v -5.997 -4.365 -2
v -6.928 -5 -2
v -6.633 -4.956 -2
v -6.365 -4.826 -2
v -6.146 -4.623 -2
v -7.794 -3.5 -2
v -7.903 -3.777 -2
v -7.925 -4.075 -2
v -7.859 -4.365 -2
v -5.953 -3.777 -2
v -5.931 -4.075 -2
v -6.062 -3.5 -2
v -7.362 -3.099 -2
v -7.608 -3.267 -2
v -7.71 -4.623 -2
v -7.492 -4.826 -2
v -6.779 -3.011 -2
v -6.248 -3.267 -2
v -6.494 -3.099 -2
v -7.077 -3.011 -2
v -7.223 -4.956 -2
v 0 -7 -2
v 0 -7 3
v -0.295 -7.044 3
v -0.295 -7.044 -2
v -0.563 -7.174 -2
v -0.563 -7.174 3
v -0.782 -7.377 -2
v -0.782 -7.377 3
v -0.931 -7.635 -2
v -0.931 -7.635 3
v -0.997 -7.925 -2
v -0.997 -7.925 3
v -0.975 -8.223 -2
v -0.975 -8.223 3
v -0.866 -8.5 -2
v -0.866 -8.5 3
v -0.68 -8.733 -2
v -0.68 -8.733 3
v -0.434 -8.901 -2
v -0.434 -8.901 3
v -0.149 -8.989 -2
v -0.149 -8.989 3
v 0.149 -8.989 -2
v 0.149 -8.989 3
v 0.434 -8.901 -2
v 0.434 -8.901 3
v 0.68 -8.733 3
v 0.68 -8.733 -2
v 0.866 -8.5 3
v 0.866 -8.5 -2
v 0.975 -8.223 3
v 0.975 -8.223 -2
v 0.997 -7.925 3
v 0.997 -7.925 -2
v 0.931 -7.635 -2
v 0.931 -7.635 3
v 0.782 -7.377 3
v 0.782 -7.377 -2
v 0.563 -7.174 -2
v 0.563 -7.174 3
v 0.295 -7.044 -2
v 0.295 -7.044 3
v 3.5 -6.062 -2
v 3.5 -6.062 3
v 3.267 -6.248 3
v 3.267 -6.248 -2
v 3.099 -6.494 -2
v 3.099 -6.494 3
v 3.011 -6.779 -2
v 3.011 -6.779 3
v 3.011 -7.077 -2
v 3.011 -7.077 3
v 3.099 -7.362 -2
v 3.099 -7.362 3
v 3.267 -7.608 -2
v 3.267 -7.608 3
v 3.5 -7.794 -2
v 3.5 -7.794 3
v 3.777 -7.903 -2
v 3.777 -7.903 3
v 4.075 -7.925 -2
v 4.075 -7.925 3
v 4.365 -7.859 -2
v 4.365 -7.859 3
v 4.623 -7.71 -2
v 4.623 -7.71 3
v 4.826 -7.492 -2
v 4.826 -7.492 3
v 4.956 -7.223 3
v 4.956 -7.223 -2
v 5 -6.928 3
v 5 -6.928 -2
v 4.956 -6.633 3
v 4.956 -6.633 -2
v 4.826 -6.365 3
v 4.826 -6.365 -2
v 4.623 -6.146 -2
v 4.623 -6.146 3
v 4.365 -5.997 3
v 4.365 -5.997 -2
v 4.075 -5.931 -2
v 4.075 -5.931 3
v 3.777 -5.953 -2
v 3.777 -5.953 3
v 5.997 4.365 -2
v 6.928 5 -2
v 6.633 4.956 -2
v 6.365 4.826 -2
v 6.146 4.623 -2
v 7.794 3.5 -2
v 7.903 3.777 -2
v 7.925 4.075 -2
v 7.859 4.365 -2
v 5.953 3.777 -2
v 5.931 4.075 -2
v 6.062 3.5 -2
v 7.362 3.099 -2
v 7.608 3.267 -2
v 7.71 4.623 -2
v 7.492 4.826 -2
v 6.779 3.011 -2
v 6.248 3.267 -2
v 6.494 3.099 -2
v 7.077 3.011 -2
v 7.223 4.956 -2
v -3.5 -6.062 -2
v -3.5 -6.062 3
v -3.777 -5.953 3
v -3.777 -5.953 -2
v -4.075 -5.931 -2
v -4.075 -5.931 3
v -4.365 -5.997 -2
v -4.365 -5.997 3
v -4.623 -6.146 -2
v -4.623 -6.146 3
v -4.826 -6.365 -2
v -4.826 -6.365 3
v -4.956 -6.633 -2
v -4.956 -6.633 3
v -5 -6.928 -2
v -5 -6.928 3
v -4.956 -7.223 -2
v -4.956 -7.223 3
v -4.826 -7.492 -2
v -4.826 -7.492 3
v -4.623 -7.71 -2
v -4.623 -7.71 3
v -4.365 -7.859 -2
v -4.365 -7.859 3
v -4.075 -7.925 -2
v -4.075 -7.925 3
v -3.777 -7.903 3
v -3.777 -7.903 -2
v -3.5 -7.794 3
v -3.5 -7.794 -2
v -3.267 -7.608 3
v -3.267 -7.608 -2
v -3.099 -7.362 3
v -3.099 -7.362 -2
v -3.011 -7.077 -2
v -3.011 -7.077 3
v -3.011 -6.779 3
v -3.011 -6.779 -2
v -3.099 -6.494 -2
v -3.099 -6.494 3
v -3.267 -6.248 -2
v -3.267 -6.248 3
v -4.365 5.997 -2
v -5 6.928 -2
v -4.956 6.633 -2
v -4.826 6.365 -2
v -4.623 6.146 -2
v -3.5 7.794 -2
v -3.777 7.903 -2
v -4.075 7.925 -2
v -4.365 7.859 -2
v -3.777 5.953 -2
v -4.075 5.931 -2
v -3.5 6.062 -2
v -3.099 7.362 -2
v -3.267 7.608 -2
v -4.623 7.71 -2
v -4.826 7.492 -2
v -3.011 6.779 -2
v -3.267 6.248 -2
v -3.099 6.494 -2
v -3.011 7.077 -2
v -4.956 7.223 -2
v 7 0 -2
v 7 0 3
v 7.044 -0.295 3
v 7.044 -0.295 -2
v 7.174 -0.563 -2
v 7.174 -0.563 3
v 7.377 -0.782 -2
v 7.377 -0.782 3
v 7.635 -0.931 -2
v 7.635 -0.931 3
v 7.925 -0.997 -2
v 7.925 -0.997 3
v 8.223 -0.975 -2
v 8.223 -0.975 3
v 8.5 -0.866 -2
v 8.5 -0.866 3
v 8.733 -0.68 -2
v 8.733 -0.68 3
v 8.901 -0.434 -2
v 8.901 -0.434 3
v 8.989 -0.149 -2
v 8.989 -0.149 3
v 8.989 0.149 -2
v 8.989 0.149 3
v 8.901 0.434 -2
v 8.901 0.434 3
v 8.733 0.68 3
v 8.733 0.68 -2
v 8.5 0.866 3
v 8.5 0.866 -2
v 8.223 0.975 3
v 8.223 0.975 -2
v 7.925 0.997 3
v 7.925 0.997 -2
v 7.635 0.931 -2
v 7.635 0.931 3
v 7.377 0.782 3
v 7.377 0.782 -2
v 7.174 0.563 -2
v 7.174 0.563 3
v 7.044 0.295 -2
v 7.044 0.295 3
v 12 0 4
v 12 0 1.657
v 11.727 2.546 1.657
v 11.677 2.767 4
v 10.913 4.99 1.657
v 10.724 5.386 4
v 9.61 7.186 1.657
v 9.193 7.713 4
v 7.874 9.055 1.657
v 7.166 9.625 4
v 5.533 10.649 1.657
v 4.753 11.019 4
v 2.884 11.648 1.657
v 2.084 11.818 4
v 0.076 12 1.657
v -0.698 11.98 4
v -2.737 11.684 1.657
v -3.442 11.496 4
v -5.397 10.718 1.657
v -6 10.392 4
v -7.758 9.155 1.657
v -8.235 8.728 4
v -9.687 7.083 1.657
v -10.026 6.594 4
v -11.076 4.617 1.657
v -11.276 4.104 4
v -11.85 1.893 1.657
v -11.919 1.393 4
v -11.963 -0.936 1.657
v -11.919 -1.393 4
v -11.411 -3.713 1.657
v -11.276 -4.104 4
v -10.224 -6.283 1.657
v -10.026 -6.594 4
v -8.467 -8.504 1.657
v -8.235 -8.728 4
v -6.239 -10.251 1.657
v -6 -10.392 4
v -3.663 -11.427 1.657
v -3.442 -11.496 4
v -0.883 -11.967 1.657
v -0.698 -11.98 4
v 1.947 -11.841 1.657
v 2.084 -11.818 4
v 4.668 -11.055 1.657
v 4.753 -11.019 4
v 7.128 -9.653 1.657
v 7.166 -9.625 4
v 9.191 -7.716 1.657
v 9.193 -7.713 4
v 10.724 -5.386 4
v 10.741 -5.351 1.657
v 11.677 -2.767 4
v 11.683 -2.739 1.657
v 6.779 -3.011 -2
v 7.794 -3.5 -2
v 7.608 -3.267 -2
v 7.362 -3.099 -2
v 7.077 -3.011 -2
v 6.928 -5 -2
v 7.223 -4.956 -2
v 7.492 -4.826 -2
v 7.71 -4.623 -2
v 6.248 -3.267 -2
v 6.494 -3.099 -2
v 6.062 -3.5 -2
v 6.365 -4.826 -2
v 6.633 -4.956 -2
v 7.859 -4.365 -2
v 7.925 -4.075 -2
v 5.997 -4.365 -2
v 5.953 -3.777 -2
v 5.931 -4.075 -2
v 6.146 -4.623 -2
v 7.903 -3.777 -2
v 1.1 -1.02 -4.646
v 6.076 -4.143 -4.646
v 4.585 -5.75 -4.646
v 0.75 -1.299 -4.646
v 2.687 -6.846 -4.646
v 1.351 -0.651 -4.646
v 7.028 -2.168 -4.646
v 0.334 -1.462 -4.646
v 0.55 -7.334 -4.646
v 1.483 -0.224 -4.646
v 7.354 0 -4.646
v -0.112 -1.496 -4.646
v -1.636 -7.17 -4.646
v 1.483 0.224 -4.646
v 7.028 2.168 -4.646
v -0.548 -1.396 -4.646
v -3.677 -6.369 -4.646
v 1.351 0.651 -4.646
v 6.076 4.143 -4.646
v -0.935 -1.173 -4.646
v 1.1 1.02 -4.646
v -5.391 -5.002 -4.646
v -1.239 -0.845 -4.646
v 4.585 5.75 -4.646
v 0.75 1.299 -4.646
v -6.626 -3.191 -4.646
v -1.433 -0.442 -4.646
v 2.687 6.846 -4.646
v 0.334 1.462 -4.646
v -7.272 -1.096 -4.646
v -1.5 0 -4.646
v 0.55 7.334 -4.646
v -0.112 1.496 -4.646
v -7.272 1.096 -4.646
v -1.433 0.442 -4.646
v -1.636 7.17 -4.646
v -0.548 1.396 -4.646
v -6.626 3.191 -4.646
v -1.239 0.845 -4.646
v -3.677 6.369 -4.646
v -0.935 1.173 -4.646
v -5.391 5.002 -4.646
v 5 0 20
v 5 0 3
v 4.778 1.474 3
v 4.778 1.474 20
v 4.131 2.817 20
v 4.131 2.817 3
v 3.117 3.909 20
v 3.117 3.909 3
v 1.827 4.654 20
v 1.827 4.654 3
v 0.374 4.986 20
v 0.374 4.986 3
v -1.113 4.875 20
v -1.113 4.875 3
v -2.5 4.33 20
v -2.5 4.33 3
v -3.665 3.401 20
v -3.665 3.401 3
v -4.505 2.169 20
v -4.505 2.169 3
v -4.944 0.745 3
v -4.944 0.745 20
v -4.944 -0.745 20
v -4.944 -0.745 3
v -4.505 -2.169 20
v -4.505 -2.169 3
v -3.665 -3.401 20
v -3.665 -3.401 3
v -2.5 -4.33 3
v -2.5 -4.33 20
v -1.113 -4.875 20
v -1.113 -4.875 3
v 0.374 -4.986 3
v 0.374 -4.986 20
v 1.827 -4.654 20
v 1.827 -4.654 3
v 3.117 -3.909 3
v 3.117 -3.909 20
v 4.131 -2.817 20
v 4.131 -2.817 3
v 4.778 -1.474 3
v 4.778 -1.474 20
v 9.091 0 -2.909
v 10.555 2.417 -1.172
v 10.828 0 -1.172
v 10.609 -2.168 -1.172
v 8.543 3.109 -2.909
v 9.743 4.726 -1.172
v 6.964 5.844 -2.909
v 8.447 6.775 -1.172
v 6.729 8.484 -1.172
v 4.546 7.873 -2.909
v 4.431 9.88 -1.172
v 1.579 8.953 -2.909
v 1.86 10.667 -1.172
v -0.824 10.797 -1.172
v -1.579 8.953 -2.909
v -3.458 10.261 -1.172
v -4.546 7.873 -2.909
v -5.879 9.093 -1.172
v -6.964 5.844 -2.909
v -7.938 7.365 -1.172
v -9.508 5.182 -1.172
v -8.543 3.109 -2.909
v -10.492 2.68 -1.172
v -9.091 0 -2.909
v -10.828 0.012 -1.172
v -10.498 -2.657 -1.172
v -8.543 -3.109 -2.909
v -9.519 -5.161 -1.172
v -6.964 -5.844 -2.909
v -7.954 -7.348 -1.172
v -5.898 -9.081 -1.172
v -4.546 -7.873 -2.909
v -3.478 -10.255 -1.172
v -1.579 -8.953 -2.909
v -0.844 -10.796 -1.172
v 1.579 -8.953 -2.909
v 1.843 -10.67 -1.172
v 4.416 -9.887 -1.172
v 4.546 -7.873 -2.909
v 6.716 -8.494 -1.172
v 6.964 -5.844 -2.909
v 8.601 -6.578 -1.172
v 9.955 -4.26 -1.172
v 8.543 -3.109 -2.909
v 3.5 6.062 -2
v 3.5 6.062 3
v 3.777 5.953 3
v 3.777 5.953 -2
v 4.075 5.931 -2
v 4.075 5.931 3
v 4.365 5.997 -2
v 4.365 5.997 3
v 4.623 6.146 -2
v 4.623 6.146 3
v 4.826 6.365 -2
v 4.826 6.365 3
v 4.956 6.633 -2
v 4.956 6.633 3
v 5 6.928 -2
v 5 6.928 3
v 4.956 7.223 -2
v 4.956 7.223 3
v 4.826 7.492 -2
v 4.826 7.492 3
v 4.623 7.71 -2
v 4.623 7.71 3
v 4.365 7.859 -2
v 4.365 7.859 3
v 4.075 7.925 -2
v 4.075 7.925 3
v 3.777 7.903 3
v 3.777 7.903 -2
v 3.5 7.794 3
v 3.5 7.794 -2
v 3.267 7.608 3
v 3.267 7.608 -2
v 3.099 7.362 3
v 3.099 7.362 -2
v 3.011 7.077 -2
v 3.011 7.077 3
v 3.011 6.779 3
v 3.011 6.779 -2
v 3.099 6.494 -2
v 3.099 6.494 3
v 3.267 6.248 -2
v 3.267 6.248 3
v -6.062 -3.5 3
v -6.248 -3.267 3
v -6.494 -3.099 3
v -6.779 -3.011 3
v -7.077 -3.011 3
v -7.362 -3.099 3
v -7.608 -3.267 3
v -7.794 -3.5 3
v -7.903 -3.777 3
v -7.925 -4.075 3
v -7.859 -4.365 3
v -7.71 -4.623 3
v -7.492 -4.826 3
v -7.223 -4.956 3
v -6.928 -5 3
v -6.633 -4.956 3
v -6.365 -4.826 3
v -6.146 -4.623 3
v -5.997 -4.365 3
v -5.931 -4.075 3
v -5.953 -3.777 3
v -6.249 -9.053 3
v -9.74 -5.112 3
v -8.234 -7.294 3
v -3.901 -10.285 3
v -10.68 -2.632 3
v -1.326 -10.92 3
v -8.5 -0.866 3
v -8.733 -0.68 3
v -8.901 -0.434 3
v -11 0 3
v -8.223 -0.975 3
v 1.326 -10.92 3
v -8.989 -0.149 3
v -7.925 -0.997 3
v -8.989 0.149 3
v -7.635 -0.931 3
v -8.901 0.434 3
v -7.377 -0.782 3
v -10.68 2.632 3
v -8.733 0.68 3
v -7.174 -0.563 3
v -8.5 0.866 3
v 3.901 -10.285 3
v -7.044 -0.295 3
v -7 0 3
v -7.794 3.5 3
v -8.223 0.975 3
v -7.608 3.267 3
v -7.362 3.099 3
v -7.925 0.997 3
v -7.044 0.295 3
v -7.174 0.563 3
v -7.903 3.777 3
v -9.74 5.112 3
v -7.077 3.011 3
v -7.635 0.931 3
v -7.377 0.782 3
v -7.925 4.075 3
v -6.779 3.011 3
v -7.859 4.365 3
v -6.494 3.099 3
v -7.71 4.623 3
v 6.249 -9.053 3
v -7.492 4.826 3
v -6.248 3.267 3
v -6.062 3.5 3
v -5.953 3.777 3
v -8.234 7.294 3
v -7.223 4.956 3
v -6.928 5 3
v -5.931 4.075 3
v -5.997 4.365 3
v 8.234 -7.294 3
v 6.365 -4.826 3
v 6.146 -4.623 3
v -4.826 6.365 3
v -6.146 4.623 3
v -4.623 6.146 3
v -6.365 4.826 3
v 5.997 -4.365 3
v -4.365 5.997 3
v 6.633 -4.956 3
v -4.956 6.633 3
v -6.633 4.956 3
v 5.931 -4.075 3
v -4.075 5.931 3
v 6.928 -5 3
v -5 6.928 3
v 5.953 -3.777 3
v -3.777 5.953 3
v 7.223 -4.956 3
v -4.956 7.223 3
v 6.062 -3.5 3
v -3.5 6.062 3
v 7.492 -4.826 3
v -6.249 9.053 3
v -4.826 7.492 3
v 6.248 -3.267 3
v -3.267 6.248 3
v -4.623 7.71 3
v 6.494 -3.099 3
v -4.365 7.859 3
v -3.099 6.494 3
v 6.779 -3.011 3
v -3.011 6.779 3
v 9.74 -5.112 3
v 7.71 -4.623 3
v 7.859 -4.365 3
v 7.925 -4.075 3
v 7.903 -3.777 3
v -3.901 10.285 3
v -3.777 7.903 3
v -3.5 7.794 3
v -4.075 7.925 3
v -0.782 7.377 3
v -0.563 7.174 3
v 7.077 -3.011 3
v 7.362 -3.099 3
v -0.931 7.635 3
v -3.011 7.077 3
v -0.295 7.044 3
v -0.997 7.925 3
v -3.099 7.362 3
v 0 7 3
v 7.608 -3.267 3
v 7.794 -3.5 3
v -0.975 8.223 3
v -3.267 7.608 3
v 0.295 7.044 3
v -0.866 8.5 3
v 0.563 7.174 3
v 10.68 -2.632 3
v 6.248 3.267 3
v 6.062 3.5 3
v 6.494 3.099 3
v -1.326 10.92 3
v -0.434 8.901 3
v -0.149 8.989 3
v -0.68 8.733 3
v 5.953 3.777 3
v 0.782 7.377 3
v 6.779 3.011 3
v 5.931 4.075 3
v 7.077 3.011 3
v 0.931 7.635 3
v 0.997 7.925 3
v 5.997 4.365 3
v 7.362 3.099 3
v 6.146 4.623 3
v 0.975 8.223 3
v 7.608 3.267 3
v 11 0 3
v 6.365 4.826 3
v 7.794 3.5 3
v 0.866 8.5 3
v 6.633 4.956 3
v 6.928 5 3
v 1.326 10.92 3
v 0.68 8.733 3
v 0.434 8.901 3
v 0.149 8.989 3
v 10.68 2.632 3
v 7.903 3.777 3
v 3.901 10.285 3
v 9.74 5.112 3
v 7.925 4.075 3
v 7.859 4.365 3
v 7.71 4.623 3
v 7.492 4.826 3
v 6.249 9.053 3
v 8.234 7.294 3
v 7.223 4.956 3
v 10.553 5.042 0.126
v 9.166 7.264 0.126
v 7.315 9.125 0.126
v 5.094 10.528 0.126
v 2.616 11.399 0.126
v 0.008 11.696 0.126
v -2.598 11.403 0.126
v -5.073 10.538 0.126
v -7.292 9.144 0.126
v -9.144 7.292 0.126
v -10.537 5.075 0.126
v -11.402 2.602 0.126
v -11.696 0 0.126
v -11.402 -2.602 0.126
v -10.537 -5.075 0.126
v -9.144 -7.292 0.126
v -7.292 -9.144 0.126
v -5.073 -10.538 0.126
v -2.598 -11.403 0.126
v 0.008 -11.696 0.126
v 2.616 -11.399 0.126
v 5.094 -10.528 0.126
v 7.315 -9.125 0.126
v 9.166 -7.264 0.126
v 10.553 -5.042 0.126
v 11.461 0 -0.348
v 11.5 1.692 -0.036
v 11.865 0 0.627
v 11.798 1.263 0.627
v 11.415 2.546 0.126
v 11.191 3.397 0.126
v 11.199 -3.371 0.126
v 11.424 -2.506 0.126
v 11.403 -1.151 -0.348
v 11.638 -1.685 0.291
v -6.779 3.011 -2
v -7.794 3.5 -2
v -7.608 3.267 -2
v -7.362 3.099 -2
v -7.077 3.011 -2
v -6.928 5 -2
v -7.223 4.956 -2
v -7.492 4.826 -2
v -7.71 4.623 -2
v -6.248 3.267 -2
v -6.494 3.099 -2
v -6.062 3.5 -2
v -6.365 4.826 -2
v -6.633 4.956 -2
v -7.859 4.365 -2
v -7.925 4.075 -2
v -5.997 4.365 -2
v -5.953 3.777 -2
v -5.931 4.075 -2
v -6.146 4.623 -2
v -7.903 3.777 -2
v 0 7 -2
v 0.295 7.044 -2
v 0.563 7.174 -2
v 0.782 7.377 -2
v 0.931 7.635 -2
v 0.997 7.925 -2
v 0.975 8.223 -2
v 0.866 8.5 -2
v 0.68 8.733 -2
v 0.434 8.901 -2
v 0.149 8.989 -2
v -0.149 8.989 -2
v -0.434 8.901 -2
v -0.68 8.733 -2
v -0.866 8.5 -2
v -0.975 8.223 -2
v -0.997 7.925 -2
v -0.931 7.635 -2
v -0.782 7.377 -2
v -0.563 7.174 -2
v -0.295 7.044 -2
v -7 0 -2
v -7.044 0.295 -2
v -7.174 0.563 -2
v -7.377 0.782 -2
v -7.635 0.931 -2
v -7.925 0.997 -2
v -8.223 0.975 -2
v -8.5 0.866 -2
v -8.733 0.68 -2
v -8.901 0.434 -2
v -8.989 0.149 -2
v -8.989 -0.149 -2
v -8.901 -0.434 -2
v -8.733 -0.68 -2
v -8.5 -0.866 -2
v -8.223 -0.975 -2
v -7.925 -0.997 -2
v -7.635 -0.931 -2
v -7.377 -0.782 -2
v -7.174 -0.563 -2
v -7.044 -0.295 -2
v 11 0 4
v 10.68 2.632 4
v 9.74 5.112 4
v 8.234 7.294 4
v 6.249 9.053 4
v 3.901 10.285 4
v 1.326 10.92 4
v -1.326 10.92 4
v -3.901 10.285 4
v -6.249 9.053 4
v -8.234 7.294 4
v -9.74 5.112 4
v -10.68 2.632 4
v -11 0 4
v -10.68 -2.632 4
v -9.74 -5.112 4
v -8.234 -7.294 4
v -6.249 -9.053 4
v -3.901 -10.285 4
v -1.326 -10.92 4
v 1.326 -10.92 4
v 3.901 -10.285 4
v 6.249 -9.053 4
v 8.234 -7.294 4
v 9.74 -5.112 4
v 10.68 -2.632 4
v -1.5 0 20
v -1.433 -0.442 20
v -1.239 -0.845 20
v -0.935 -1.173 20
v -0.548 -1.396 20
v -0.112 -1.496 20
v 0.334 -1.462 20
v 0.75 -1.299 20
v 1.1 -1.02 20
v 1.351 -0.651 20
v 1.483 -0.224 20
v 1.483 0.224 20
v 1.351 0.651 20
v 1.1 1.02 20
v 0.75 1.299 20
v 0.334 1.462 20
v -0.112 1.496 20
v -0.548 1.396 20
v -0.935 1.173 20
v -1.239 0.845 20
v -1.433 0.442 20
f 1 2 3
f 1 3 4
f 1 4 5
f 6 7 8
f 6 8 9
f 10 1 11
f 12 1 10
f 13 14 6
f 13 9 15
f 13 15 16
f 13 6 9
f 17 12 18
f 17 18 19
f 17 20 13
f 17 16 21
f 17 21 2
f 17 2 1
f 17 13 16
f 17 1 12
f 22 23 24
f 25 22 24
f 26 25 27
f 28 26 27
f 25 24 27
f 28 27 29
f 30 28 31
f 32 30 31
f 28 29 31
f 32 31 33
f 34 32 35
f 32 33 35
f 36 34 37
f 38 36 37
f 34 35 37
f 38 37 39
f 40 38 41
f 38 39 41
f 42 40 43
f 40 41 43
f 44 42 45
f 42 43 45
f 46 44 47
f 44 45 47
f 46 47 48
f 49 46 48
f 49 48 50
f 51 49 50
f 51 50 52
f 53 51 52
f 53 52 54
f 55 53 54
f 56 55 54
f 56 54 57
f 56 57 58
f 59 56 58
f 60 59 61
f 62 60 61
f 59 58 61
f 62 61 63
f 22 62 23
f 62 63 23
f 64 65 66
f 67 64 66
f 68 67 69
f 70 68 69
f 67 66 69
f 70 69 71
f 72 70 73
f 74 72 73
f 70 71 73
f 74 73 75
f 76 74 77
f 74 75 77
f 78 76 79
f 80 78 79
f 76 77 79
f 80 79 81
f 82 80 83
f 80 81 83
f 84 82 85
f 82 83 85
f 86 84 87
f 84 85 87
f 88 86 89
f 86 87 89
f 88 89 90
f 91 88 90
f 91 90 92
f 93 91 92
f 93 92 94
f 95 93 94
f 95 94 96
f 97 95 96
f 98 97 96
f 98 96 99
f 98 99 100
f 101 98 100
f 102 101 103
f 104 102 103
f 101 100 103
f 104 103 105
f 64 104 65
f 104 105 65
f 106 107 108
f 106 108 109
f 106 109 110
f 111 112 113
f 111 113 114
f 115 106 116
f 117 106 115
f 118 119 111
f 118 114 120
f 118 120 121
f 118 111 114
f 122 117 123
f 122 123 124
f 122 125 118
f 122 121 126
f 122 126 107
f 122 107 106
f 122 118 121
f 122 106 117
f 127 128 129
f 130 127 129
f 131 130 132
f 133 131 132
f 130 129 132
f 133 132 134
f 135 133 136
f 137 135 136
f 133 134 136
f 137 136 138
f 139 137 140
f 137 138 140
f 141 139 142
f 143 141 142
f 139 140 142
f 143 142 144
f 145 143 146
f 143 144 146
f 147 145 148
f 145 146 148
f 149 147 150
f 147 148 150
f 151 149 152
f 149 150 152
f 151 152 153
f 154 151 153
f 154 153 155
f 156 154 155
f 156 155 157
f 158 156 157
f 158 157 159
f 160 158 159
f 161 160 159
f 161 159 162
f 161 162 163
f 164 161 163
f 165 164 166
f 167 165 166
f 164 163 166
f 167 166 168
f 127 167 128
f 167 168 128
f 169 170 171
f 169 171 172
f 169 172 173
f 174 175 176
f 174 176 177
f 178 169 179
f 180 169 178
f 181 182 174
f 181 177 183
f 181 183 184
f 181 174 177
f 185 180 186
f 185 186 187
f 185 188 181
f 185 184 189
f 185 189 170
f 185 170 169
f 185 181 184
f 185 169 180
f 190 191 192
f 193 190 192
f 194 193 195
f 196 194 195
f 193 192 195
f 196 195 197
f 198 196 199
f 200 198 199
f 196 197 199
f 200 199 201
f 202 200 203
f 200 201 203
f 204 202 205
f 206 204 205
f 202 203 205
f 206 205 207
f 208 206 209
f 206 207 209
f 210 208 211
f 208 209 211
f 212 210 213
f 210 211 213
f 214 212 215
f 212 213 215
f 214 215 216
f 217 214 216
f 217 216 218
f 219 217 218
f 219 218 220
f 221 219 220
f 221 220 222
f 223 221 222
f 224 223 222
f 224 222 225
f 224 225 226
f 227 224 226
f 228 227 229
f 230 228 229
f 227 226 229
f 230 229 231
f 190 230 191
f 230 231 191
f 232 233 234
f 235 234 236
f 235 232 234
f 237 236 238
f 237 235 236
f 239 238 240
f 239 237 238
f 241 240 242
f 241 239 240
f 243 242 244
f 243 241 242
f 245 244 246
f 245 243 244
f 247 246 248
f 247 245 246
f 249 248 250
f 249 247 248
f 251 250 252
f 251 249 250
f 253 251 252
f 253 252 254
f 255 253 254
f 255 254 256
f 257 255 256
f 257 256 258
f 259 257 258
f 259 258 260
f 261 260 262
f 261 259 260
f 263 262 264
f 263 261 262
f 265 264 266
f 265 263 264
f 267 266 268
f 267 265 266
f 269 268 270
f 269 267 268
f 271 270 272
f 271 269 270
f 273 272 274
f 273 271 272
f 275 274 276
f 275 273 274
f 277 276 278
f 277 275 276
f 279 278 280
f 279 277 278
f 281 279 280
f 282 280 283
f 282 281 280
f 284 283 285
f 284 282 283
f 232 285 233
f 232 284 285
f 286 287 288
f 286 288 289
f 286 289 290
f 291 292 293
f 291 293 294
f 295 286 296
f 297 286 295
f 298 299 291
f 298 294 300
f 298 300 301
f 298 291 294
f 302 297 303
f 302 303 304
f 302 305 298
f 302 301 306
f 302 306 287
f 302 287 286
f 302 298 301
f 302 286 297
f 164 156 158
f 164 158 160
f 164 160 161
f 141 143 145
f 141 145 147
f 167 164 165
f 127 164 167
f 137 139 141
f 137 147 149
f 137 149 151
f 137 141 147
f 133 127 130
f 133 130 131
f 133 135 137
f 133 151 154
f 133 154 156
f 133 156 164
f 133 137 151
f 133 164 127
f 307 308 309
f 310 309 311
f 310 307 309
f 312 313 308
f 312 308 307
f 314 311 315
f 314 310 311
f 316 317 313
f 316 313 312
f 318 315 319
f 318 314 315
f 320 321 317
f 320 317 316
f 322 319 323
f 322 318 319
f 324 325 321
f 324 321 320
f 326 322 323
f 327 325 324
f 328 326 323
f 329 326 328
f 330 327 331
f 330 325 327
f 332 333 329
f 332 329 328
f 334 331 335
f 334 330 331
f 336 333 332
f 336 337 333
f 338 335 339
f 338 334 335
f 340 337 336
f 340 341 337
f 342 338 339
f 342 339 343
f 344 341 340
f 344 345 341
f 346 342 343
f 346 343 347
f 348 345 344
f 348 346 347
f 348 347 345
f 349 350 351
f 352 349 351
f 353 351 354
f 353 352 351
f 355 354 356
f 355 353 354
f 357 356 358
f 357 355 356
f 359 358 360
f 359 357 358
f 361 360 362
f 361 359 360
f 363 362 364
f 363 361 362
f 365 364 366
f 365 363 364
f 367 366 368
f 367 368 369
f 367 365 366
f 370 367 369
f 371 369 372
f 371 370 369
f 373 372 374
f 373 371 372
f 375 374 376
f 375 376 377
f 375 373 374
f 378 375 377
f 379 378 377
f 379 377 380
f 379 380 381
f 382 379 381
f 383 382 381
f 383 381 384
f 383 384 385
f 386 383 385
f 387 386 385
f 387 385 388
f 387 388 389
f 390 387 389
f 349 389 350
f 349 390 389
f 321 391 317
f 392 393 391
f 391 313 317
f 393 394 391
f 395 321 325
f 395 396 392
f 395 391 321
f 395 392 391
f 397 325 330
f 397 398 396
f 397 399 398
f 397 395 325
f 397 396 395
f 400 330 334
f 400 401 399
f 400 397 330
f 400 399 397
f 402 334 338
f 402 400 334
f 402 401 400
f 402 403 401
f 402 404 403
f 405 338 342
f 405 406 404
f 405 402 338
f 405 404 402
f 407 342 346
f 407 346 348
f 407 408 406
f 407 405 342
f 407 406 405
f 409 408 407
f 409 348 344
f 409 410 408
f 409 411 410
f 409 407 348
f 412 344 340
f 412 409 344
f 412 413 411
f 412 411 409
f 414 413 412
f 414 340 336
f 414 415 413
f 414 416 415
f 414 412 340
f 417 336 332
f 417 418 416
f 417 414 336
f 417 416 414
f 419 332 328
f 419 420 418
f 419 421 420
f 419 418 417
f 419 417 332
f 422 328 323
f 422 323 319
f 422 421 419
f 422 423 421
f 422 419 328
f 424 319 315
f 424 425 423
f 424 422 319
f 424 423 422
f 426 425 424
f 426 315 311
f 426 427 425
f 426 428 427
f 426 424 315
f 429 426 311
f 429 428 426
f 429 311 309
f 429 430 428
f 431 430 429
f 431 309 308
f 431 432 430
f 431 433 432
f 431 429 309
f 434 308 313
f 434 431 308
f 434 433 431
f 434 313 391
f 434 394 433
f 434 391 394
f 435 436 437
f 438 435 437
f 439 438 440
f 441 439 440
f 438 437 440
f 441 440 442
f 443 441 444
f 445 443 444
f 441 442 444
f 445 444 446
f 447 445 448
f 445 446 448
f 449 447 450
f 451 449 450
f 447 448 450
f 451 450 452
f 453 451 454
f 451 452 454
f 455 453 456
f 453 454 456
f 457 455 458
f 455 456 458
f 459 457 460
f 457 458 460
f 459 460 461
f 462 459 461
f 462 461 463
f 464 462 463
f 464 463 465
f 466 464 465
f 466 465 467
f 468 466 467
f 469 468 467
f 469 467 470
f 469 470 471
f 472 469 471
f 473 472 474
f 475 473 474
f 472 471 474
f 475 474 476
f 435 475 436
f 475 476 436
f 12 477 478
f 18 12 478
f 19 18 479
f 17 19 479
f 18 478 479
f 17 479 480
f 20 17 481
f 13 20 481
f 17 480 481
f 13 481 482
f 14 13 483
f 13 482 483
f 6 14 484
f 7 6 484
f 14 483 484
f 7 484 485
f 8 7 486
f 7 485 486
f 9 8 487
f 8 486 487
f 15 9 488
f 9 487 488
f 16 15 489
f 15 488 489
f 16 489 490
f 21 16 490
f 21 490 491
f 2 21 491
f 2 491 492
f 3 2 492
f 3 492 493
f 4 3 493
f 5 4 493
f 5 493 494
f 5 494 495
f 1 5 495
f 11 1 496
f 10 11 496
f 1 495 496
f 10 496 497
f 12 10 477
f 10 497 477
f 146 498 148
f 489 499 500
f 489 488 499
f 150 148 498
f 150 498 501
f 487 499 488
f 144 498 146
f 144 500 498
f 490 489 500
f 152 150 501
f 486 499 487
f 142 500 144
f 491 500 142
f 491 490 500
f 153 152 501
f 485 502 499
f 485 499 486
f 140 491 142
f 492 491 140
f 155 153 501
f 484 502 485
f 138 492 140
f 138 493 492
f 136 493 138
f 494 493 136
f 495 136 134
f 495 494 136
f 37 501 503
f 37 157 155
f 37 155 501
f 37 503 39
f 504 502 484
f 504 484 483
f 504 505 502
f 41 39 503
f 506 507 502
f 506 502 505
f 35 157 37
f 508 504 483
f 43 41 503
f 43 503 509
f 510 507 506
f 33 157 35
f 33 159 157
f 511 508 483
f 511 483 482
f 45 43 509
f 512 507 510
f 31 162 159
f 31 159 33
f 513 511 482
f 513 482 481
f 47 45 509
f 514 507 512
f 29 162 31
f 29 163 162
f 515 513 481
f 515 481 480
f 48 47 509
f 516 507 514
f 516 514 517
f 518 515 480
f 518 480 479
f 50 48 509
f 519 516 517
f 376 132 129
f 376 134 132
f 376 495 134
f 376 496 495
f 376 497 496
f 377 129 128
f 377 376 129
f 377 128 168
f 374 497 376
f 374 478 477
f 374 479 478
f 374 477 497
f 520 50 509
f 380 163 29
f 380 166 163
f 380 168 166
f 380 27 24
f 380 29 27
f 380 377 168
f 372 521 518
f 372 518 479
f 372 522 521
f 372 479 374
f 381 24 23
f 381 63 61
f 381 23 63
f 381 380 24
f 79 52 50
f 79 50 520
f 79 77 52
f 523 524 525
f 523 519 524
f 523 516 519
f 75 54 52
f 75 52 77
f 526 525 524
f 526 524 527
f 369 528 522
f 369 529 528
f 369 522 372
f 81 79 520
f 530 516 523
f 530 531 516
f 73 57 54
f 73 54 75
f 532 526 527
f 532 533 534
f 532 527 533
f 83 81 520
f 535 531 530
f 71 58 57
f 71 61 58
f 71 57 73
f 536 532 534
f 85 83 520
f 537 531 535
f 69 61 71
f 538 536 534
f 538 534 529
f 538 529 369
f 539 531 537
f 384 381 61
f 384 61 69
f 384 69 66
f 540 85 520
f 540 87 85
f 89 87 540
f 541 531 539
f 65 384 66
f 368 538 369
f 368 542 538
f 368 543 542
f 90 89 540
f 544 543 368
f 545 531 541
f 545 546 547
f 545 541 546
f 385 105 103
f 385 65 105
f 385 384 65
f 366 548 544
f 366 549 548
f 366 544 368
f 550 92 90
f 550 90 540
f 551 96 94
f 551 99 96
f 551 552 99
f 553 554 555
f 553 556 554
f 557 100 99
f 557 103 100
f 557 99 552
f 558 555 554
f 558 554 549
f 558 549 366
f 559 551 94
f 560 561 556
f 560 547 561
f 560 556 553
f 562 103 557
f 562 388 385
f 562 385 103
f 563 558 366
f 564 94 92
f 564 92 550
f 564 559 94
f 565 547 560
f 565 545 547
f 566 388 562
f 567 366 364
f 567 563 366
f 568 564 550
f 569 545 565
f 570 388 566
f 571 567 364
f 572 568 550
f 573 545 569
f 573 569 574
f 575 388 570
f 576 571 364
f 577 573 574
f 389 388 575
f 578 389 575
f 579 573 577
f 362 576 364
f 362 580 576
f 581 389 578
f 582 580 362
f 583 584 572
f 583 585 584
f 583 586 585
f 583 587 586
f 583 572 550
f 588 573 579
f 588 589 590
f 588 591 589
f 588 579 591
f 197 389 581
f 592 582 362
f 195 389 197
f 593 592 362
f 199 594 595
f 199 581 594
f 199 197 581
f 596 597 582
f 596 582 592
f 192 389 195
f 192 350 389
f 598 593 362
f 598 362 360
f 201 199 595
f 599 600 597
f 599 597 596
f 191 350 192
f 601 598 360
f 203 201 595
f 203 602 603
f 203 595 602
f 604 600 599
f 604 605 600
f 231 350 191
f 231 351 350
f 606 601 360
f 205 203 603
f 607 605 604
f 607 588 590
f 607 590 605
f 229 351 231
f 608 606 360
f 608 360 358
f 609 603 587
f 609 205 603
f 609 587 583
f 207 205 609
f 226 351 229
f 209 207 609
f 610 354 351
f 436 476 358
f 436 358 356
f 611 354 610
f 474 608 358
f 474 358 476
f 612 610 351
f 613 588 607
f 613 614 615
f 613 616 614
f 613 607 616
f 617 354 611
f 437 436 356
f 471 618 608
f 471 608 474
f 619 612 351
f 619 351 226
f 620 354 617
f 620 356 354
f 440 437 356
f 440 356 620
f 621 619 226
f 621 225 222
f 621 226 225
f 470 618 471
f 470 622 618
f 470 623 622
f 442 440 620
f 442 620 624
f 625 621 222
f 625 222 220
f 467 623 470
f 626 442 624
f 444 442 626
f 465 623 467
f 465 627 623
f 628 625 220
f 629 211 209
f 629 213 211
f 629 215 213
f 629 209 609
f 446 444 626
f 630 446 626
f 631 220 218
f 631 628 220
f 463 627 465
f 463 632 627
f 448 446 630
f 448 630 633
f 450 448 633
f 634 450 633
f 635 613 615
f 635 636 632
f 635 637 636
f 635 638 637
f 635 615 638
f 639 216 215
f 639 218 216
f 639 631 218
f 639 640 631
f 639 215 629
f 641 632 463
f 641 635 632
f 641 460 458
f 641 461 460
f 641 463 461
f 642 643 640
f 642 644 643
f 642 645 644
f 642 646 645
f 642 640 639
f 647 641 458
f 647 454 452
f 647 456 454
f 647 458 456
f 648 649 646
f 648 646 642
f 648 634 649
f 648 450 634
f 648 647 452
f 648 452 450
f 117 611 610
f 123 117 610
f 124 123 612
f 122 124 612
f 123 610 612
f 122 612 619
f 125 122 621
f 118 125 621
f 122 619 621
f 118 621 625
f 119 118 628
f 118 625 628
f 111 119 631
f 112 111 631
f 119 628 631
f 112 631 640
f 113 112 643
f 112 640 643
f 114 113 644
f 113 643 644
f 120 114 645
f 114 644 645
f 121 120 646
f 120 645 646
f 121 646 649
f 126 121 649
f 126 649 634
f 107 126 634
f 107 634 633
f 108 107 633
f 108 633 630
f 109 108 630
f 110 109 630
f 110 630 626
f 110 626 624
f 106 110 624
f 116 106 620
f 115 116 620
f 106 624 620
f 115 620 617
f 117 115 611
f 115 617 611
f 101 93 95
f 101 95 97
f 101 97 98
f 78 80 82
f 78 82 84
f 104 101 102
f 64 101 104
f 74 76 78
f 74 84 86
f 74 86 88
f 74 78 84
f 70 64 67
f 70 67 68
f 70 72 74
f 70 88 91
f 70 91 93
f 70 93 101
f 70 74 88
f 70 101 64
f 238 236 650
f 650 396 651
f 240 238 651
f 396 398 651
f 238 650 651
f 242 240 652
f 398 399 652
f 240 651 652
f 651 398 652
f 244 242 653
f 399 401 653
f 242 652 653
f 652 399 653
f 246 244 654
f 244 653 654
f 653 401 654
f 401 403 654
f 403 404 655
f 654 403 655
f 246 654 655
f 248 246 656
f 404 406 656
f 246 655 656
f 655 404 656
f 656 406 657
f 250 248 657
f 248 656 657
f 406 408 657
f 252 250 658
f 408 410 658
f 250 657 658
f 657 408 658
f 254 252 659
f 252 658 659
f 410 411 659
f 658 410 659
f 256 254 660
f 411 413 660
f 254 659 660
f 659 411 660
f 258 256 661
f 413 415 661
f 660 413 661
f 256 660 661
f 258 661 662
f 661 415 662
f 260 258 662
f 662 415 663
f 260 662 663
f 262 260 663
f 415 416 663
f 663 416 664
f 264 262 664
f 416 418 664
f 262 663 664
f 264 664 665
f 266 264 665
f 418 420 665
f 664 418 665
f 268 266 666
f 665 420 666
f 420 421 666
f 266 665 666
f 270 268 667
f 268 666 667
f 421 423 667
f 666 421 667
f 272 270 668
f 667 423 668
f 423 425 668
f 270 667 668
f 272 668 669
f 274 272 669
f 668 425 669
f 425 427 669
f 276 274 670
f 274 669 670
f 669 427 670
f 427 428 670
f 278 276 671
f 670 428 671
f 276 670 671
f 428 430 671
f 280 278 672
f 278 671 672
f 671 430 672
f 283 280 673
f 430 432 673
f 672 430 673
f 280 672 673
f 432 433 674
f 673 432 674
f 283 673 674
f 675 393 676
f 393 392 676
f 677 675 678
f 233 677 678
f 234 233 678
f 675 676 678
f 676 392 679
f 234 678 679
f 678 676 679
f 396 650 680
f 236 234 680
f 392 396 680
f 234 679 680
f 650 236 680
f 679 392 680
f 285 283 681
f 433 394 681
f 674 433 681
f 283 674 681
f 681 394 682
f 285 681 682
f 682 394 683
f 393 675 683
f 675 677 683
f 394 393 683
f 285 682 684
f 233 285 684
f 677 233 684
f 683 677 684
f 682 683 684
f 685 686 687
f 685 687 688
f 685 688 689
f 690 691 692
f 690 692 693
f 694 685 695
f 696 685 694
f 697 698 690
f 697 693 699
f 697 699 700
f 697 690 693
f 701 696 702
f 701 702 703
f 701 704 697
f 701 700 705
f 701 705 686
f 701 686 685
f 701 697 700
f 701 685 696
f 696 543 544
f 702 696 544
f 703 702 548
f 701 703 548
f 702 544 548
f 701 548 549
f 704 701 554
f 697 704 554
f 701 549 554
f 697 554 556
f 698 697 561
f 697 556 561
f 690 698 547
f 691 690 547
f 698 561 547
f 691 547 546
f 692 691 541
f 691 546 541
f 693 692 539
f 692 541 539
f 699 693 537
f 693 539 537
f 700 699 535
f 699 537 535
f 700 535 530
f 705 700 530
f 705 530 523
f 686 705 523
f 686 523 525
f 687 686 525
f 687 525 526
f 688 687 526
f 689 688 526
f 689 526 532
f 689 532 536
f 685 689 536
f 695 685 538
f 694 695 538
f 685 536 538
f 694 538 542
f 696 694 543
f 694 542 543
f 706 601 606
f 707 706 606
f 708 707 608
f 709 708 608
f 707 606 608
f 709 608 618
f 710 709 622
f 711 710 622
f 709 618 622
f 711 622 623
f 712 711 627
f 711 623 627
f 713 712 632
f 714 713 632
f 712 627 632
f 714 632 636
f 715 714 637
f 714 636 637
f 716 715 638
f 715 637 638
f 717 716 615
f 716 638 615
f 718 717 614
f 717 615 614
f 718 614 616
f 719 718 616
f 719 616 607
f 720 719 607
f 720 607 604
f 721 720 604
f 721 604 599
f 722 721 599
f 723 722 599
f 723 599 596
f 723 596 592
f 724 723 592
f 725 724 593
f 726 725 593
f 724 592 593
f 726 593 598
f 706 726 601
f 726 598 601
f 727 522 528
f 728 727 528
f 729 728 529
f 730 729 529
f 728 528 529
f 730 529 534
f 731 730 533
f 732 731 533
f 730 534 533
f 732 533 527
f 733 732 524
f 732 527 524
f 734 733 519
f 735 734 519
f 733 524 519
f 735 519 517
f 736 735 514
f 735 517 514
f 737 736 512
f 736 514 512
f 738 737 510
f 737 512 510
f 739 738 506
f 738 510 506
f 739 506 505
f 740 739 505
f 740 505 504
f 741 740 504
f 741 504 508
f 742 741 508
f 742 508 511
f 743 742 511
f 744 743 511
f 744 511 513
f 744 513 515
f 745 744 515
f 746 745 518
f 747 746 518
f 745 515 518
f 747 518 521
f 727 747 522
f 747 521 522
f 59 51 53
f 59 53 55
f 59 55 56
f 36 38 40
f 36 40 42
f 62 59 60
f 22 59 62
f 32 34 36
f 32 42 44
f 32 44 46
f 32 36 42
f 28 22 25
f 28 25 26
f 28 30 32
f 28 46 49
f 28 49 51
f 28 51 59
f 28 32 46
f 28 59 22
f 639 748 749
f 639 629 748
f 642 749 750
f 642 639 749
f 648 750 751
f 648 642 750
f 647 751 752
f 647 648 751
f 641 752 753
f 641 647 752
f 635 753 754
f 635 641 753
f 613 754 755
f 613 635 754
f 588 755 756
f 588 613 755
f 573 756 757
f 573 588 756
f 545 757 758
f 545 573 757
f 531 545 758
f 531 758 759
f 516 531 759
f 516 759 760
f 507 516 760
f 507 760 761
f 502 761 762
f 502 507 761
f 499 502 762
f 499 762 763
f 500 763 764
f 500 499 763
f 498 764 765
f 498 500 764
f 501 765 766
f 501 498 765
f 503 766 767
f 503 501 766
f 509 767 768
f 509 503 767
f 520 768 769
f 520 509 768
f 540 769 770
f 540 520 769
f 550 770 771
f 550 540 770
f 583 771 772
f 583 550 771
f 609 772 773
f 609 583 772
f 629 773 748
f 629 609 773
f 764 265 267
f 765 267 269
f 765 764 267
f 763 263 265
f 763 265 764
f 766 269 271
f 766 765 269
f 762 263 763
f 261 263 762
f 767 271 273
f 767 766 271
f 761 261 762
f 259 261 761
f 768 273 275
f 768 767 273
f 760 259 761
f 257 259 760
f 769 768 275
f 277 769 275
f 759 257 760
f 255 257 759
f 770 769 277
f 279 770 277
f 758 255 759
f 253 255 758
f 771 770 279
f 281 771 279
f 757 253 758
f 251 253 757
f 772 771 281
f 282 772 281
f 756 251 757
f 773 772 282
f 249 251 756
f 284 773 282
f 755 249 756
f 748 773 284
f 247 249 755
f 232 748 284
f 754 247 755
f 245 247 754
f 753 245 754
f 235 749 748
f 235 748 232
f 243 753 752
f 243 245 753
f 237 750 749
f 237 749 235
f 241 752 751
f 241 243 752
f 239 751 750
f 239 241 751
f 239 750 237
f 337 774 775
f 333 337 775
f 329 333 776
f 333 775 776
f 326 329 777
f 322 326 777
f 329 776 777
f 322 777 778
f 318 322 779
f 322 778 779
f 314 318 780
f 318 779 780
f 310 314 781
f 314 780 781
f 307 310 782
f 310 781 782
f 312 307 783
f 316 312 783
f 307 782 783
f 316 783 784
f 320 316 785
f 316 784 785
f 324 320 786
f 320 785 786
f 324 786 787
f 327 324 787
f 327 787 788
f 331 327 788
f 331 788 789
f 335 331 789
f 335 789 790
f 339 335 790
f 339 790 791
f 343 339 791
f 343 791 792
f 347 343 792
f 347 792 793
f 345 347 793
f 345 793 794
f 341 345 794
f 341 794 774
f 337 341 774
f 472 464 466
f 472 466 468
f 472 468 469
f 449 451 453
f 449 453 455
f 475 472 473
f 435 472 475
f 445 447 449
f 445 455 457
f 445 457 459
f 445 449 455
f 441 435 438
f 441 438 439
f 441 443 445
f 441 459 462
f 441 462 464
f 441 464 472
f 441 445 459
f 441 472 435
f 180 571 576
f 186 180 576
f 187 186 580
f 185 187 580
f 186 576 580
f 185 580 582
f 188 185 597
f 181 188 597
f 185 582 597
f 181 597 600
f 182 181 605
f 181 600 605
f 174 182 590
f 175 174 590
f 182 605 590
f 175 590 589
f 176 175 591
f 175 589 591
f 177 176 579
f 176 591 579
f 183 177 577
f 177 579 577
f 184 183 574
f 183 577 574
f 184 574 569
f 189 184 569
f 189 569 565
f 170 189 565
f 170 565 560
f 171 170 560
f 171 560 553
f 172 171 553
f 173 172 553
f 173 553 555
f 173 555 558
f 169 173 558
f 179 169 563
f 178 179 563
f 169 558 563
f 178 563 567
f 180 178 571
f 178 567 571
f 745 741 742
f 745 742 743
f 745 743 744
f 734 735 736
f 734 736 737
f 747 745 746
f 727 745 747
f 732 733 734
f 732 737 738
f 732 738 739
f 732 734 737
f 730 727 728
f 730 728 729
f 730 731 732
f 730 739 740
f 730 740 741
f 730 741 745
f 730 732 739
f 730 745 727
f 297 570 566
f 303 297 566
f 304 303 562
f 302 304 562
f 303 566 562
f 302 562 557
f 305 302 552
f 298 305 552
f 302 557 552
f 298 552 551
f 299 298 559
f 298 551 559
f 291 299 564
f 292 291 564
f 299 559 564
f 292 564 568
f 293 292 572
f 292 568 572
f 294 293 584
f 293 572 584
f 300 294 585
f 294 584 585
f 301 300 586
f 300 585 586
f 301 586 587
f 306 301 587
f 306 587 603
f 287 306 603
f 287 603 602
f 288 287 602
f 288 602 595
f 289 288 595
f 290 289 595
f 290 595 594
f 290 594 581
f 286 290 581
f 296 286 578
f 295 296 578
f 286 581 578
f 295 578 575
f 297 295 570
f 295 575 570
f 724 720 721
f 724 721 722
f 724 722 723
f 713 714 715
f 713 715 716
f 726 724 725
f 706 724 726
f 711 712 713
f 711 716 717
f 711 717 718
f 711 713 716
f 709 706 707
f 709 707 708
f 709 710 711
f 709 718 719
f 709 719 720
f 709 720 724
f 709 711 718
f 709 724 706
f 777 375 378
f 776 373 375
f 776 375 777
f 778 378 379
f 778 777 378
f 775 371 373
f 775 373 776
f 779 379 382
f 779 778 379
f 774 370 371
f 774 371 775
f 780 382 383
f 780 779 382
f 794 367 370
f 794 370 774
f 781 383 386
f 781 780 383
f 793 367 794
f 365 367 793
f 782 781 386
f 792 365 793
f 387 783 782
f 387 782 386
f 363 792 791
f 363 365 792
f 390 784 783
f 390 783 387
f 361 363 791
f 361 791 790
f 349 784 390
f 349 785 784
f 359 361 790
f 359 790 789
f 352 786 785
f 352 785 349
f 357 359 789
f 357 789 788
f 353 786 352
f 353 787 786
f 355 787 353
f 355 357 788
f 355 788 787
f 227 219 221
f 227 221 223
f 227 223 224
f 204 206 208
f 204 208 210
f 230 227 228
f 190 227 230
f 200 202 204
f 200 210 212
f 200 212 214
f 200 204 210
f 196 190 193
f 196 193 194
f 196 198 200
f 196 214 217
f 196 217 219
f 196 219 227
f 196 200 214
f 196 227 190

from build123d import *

# Parameters (mm, degrees)
SKETCH001_R        = 1.5
POCKET_DEPTH       = 24.646751
SKETCH002_R        = 1
POCKET001_DEPTH    = 5
POLARPATTERN_COUNT = 12
FILLET_R           = 4


with BuildPart() as part:
    # Sketch → Revolution (revolve)
    with BuildSketch(Plane.XZ):
        Polygon((0, -4.645751), (7.354249, -4.645751), (12, 0), (12, 4), (11, 4), (11, 3), (5, 3), (5, 20), (0, 20), align=None)
    revolve(axis=Axis((0, 0, 0), (0, 0, 1)))

    # Sketch001 (on Face8 of Revolution) → Pocket (cut, through all)
    with BuildSketch(Plane(origin=(0, 0, 20), x_dir=(-1, 0, 0), z_dir=(0, 0, 1))):
        Circle(SKETCH001_R)
    extrude(amount=-POCKET_DEPTH, mode=Mode.SUBTRACT)

    # Sketch002 (on Face9 of Pocket) → Pocket001 (cut)
    with BuildSketch(Plane(origin=(0, 0, 3), x_dir=(-1, 0, 0), z_dir=(0, 0, 1))):
        with Locations((-8, 0)):
            Circle(SKETCH002_R)
    pocket001 = extrude(amount=-POCKET001_DEPTH, mode=Mode.SUBTRACT)

    # PolarPattern: Pocket001 ×12 about axis
    polarpattern_axis = Axis((0, 0, 3), (0, 0, 1))
    for i in range(1, POLARPATTERN_COUNT):
        add(pocket001.rotate(polarpattern_axis, i * 360 / POLARPATTERN_COUNT), mode=Mode.SUBTRACT)

    # Fillet
    fillet_edges = [part.edges().sort_by_distance(p)[0] for p in [
        (-12, 0, 0),
    ]]
    fillet(fillet_edges, radius=FILLET_R)


solid = part.part
